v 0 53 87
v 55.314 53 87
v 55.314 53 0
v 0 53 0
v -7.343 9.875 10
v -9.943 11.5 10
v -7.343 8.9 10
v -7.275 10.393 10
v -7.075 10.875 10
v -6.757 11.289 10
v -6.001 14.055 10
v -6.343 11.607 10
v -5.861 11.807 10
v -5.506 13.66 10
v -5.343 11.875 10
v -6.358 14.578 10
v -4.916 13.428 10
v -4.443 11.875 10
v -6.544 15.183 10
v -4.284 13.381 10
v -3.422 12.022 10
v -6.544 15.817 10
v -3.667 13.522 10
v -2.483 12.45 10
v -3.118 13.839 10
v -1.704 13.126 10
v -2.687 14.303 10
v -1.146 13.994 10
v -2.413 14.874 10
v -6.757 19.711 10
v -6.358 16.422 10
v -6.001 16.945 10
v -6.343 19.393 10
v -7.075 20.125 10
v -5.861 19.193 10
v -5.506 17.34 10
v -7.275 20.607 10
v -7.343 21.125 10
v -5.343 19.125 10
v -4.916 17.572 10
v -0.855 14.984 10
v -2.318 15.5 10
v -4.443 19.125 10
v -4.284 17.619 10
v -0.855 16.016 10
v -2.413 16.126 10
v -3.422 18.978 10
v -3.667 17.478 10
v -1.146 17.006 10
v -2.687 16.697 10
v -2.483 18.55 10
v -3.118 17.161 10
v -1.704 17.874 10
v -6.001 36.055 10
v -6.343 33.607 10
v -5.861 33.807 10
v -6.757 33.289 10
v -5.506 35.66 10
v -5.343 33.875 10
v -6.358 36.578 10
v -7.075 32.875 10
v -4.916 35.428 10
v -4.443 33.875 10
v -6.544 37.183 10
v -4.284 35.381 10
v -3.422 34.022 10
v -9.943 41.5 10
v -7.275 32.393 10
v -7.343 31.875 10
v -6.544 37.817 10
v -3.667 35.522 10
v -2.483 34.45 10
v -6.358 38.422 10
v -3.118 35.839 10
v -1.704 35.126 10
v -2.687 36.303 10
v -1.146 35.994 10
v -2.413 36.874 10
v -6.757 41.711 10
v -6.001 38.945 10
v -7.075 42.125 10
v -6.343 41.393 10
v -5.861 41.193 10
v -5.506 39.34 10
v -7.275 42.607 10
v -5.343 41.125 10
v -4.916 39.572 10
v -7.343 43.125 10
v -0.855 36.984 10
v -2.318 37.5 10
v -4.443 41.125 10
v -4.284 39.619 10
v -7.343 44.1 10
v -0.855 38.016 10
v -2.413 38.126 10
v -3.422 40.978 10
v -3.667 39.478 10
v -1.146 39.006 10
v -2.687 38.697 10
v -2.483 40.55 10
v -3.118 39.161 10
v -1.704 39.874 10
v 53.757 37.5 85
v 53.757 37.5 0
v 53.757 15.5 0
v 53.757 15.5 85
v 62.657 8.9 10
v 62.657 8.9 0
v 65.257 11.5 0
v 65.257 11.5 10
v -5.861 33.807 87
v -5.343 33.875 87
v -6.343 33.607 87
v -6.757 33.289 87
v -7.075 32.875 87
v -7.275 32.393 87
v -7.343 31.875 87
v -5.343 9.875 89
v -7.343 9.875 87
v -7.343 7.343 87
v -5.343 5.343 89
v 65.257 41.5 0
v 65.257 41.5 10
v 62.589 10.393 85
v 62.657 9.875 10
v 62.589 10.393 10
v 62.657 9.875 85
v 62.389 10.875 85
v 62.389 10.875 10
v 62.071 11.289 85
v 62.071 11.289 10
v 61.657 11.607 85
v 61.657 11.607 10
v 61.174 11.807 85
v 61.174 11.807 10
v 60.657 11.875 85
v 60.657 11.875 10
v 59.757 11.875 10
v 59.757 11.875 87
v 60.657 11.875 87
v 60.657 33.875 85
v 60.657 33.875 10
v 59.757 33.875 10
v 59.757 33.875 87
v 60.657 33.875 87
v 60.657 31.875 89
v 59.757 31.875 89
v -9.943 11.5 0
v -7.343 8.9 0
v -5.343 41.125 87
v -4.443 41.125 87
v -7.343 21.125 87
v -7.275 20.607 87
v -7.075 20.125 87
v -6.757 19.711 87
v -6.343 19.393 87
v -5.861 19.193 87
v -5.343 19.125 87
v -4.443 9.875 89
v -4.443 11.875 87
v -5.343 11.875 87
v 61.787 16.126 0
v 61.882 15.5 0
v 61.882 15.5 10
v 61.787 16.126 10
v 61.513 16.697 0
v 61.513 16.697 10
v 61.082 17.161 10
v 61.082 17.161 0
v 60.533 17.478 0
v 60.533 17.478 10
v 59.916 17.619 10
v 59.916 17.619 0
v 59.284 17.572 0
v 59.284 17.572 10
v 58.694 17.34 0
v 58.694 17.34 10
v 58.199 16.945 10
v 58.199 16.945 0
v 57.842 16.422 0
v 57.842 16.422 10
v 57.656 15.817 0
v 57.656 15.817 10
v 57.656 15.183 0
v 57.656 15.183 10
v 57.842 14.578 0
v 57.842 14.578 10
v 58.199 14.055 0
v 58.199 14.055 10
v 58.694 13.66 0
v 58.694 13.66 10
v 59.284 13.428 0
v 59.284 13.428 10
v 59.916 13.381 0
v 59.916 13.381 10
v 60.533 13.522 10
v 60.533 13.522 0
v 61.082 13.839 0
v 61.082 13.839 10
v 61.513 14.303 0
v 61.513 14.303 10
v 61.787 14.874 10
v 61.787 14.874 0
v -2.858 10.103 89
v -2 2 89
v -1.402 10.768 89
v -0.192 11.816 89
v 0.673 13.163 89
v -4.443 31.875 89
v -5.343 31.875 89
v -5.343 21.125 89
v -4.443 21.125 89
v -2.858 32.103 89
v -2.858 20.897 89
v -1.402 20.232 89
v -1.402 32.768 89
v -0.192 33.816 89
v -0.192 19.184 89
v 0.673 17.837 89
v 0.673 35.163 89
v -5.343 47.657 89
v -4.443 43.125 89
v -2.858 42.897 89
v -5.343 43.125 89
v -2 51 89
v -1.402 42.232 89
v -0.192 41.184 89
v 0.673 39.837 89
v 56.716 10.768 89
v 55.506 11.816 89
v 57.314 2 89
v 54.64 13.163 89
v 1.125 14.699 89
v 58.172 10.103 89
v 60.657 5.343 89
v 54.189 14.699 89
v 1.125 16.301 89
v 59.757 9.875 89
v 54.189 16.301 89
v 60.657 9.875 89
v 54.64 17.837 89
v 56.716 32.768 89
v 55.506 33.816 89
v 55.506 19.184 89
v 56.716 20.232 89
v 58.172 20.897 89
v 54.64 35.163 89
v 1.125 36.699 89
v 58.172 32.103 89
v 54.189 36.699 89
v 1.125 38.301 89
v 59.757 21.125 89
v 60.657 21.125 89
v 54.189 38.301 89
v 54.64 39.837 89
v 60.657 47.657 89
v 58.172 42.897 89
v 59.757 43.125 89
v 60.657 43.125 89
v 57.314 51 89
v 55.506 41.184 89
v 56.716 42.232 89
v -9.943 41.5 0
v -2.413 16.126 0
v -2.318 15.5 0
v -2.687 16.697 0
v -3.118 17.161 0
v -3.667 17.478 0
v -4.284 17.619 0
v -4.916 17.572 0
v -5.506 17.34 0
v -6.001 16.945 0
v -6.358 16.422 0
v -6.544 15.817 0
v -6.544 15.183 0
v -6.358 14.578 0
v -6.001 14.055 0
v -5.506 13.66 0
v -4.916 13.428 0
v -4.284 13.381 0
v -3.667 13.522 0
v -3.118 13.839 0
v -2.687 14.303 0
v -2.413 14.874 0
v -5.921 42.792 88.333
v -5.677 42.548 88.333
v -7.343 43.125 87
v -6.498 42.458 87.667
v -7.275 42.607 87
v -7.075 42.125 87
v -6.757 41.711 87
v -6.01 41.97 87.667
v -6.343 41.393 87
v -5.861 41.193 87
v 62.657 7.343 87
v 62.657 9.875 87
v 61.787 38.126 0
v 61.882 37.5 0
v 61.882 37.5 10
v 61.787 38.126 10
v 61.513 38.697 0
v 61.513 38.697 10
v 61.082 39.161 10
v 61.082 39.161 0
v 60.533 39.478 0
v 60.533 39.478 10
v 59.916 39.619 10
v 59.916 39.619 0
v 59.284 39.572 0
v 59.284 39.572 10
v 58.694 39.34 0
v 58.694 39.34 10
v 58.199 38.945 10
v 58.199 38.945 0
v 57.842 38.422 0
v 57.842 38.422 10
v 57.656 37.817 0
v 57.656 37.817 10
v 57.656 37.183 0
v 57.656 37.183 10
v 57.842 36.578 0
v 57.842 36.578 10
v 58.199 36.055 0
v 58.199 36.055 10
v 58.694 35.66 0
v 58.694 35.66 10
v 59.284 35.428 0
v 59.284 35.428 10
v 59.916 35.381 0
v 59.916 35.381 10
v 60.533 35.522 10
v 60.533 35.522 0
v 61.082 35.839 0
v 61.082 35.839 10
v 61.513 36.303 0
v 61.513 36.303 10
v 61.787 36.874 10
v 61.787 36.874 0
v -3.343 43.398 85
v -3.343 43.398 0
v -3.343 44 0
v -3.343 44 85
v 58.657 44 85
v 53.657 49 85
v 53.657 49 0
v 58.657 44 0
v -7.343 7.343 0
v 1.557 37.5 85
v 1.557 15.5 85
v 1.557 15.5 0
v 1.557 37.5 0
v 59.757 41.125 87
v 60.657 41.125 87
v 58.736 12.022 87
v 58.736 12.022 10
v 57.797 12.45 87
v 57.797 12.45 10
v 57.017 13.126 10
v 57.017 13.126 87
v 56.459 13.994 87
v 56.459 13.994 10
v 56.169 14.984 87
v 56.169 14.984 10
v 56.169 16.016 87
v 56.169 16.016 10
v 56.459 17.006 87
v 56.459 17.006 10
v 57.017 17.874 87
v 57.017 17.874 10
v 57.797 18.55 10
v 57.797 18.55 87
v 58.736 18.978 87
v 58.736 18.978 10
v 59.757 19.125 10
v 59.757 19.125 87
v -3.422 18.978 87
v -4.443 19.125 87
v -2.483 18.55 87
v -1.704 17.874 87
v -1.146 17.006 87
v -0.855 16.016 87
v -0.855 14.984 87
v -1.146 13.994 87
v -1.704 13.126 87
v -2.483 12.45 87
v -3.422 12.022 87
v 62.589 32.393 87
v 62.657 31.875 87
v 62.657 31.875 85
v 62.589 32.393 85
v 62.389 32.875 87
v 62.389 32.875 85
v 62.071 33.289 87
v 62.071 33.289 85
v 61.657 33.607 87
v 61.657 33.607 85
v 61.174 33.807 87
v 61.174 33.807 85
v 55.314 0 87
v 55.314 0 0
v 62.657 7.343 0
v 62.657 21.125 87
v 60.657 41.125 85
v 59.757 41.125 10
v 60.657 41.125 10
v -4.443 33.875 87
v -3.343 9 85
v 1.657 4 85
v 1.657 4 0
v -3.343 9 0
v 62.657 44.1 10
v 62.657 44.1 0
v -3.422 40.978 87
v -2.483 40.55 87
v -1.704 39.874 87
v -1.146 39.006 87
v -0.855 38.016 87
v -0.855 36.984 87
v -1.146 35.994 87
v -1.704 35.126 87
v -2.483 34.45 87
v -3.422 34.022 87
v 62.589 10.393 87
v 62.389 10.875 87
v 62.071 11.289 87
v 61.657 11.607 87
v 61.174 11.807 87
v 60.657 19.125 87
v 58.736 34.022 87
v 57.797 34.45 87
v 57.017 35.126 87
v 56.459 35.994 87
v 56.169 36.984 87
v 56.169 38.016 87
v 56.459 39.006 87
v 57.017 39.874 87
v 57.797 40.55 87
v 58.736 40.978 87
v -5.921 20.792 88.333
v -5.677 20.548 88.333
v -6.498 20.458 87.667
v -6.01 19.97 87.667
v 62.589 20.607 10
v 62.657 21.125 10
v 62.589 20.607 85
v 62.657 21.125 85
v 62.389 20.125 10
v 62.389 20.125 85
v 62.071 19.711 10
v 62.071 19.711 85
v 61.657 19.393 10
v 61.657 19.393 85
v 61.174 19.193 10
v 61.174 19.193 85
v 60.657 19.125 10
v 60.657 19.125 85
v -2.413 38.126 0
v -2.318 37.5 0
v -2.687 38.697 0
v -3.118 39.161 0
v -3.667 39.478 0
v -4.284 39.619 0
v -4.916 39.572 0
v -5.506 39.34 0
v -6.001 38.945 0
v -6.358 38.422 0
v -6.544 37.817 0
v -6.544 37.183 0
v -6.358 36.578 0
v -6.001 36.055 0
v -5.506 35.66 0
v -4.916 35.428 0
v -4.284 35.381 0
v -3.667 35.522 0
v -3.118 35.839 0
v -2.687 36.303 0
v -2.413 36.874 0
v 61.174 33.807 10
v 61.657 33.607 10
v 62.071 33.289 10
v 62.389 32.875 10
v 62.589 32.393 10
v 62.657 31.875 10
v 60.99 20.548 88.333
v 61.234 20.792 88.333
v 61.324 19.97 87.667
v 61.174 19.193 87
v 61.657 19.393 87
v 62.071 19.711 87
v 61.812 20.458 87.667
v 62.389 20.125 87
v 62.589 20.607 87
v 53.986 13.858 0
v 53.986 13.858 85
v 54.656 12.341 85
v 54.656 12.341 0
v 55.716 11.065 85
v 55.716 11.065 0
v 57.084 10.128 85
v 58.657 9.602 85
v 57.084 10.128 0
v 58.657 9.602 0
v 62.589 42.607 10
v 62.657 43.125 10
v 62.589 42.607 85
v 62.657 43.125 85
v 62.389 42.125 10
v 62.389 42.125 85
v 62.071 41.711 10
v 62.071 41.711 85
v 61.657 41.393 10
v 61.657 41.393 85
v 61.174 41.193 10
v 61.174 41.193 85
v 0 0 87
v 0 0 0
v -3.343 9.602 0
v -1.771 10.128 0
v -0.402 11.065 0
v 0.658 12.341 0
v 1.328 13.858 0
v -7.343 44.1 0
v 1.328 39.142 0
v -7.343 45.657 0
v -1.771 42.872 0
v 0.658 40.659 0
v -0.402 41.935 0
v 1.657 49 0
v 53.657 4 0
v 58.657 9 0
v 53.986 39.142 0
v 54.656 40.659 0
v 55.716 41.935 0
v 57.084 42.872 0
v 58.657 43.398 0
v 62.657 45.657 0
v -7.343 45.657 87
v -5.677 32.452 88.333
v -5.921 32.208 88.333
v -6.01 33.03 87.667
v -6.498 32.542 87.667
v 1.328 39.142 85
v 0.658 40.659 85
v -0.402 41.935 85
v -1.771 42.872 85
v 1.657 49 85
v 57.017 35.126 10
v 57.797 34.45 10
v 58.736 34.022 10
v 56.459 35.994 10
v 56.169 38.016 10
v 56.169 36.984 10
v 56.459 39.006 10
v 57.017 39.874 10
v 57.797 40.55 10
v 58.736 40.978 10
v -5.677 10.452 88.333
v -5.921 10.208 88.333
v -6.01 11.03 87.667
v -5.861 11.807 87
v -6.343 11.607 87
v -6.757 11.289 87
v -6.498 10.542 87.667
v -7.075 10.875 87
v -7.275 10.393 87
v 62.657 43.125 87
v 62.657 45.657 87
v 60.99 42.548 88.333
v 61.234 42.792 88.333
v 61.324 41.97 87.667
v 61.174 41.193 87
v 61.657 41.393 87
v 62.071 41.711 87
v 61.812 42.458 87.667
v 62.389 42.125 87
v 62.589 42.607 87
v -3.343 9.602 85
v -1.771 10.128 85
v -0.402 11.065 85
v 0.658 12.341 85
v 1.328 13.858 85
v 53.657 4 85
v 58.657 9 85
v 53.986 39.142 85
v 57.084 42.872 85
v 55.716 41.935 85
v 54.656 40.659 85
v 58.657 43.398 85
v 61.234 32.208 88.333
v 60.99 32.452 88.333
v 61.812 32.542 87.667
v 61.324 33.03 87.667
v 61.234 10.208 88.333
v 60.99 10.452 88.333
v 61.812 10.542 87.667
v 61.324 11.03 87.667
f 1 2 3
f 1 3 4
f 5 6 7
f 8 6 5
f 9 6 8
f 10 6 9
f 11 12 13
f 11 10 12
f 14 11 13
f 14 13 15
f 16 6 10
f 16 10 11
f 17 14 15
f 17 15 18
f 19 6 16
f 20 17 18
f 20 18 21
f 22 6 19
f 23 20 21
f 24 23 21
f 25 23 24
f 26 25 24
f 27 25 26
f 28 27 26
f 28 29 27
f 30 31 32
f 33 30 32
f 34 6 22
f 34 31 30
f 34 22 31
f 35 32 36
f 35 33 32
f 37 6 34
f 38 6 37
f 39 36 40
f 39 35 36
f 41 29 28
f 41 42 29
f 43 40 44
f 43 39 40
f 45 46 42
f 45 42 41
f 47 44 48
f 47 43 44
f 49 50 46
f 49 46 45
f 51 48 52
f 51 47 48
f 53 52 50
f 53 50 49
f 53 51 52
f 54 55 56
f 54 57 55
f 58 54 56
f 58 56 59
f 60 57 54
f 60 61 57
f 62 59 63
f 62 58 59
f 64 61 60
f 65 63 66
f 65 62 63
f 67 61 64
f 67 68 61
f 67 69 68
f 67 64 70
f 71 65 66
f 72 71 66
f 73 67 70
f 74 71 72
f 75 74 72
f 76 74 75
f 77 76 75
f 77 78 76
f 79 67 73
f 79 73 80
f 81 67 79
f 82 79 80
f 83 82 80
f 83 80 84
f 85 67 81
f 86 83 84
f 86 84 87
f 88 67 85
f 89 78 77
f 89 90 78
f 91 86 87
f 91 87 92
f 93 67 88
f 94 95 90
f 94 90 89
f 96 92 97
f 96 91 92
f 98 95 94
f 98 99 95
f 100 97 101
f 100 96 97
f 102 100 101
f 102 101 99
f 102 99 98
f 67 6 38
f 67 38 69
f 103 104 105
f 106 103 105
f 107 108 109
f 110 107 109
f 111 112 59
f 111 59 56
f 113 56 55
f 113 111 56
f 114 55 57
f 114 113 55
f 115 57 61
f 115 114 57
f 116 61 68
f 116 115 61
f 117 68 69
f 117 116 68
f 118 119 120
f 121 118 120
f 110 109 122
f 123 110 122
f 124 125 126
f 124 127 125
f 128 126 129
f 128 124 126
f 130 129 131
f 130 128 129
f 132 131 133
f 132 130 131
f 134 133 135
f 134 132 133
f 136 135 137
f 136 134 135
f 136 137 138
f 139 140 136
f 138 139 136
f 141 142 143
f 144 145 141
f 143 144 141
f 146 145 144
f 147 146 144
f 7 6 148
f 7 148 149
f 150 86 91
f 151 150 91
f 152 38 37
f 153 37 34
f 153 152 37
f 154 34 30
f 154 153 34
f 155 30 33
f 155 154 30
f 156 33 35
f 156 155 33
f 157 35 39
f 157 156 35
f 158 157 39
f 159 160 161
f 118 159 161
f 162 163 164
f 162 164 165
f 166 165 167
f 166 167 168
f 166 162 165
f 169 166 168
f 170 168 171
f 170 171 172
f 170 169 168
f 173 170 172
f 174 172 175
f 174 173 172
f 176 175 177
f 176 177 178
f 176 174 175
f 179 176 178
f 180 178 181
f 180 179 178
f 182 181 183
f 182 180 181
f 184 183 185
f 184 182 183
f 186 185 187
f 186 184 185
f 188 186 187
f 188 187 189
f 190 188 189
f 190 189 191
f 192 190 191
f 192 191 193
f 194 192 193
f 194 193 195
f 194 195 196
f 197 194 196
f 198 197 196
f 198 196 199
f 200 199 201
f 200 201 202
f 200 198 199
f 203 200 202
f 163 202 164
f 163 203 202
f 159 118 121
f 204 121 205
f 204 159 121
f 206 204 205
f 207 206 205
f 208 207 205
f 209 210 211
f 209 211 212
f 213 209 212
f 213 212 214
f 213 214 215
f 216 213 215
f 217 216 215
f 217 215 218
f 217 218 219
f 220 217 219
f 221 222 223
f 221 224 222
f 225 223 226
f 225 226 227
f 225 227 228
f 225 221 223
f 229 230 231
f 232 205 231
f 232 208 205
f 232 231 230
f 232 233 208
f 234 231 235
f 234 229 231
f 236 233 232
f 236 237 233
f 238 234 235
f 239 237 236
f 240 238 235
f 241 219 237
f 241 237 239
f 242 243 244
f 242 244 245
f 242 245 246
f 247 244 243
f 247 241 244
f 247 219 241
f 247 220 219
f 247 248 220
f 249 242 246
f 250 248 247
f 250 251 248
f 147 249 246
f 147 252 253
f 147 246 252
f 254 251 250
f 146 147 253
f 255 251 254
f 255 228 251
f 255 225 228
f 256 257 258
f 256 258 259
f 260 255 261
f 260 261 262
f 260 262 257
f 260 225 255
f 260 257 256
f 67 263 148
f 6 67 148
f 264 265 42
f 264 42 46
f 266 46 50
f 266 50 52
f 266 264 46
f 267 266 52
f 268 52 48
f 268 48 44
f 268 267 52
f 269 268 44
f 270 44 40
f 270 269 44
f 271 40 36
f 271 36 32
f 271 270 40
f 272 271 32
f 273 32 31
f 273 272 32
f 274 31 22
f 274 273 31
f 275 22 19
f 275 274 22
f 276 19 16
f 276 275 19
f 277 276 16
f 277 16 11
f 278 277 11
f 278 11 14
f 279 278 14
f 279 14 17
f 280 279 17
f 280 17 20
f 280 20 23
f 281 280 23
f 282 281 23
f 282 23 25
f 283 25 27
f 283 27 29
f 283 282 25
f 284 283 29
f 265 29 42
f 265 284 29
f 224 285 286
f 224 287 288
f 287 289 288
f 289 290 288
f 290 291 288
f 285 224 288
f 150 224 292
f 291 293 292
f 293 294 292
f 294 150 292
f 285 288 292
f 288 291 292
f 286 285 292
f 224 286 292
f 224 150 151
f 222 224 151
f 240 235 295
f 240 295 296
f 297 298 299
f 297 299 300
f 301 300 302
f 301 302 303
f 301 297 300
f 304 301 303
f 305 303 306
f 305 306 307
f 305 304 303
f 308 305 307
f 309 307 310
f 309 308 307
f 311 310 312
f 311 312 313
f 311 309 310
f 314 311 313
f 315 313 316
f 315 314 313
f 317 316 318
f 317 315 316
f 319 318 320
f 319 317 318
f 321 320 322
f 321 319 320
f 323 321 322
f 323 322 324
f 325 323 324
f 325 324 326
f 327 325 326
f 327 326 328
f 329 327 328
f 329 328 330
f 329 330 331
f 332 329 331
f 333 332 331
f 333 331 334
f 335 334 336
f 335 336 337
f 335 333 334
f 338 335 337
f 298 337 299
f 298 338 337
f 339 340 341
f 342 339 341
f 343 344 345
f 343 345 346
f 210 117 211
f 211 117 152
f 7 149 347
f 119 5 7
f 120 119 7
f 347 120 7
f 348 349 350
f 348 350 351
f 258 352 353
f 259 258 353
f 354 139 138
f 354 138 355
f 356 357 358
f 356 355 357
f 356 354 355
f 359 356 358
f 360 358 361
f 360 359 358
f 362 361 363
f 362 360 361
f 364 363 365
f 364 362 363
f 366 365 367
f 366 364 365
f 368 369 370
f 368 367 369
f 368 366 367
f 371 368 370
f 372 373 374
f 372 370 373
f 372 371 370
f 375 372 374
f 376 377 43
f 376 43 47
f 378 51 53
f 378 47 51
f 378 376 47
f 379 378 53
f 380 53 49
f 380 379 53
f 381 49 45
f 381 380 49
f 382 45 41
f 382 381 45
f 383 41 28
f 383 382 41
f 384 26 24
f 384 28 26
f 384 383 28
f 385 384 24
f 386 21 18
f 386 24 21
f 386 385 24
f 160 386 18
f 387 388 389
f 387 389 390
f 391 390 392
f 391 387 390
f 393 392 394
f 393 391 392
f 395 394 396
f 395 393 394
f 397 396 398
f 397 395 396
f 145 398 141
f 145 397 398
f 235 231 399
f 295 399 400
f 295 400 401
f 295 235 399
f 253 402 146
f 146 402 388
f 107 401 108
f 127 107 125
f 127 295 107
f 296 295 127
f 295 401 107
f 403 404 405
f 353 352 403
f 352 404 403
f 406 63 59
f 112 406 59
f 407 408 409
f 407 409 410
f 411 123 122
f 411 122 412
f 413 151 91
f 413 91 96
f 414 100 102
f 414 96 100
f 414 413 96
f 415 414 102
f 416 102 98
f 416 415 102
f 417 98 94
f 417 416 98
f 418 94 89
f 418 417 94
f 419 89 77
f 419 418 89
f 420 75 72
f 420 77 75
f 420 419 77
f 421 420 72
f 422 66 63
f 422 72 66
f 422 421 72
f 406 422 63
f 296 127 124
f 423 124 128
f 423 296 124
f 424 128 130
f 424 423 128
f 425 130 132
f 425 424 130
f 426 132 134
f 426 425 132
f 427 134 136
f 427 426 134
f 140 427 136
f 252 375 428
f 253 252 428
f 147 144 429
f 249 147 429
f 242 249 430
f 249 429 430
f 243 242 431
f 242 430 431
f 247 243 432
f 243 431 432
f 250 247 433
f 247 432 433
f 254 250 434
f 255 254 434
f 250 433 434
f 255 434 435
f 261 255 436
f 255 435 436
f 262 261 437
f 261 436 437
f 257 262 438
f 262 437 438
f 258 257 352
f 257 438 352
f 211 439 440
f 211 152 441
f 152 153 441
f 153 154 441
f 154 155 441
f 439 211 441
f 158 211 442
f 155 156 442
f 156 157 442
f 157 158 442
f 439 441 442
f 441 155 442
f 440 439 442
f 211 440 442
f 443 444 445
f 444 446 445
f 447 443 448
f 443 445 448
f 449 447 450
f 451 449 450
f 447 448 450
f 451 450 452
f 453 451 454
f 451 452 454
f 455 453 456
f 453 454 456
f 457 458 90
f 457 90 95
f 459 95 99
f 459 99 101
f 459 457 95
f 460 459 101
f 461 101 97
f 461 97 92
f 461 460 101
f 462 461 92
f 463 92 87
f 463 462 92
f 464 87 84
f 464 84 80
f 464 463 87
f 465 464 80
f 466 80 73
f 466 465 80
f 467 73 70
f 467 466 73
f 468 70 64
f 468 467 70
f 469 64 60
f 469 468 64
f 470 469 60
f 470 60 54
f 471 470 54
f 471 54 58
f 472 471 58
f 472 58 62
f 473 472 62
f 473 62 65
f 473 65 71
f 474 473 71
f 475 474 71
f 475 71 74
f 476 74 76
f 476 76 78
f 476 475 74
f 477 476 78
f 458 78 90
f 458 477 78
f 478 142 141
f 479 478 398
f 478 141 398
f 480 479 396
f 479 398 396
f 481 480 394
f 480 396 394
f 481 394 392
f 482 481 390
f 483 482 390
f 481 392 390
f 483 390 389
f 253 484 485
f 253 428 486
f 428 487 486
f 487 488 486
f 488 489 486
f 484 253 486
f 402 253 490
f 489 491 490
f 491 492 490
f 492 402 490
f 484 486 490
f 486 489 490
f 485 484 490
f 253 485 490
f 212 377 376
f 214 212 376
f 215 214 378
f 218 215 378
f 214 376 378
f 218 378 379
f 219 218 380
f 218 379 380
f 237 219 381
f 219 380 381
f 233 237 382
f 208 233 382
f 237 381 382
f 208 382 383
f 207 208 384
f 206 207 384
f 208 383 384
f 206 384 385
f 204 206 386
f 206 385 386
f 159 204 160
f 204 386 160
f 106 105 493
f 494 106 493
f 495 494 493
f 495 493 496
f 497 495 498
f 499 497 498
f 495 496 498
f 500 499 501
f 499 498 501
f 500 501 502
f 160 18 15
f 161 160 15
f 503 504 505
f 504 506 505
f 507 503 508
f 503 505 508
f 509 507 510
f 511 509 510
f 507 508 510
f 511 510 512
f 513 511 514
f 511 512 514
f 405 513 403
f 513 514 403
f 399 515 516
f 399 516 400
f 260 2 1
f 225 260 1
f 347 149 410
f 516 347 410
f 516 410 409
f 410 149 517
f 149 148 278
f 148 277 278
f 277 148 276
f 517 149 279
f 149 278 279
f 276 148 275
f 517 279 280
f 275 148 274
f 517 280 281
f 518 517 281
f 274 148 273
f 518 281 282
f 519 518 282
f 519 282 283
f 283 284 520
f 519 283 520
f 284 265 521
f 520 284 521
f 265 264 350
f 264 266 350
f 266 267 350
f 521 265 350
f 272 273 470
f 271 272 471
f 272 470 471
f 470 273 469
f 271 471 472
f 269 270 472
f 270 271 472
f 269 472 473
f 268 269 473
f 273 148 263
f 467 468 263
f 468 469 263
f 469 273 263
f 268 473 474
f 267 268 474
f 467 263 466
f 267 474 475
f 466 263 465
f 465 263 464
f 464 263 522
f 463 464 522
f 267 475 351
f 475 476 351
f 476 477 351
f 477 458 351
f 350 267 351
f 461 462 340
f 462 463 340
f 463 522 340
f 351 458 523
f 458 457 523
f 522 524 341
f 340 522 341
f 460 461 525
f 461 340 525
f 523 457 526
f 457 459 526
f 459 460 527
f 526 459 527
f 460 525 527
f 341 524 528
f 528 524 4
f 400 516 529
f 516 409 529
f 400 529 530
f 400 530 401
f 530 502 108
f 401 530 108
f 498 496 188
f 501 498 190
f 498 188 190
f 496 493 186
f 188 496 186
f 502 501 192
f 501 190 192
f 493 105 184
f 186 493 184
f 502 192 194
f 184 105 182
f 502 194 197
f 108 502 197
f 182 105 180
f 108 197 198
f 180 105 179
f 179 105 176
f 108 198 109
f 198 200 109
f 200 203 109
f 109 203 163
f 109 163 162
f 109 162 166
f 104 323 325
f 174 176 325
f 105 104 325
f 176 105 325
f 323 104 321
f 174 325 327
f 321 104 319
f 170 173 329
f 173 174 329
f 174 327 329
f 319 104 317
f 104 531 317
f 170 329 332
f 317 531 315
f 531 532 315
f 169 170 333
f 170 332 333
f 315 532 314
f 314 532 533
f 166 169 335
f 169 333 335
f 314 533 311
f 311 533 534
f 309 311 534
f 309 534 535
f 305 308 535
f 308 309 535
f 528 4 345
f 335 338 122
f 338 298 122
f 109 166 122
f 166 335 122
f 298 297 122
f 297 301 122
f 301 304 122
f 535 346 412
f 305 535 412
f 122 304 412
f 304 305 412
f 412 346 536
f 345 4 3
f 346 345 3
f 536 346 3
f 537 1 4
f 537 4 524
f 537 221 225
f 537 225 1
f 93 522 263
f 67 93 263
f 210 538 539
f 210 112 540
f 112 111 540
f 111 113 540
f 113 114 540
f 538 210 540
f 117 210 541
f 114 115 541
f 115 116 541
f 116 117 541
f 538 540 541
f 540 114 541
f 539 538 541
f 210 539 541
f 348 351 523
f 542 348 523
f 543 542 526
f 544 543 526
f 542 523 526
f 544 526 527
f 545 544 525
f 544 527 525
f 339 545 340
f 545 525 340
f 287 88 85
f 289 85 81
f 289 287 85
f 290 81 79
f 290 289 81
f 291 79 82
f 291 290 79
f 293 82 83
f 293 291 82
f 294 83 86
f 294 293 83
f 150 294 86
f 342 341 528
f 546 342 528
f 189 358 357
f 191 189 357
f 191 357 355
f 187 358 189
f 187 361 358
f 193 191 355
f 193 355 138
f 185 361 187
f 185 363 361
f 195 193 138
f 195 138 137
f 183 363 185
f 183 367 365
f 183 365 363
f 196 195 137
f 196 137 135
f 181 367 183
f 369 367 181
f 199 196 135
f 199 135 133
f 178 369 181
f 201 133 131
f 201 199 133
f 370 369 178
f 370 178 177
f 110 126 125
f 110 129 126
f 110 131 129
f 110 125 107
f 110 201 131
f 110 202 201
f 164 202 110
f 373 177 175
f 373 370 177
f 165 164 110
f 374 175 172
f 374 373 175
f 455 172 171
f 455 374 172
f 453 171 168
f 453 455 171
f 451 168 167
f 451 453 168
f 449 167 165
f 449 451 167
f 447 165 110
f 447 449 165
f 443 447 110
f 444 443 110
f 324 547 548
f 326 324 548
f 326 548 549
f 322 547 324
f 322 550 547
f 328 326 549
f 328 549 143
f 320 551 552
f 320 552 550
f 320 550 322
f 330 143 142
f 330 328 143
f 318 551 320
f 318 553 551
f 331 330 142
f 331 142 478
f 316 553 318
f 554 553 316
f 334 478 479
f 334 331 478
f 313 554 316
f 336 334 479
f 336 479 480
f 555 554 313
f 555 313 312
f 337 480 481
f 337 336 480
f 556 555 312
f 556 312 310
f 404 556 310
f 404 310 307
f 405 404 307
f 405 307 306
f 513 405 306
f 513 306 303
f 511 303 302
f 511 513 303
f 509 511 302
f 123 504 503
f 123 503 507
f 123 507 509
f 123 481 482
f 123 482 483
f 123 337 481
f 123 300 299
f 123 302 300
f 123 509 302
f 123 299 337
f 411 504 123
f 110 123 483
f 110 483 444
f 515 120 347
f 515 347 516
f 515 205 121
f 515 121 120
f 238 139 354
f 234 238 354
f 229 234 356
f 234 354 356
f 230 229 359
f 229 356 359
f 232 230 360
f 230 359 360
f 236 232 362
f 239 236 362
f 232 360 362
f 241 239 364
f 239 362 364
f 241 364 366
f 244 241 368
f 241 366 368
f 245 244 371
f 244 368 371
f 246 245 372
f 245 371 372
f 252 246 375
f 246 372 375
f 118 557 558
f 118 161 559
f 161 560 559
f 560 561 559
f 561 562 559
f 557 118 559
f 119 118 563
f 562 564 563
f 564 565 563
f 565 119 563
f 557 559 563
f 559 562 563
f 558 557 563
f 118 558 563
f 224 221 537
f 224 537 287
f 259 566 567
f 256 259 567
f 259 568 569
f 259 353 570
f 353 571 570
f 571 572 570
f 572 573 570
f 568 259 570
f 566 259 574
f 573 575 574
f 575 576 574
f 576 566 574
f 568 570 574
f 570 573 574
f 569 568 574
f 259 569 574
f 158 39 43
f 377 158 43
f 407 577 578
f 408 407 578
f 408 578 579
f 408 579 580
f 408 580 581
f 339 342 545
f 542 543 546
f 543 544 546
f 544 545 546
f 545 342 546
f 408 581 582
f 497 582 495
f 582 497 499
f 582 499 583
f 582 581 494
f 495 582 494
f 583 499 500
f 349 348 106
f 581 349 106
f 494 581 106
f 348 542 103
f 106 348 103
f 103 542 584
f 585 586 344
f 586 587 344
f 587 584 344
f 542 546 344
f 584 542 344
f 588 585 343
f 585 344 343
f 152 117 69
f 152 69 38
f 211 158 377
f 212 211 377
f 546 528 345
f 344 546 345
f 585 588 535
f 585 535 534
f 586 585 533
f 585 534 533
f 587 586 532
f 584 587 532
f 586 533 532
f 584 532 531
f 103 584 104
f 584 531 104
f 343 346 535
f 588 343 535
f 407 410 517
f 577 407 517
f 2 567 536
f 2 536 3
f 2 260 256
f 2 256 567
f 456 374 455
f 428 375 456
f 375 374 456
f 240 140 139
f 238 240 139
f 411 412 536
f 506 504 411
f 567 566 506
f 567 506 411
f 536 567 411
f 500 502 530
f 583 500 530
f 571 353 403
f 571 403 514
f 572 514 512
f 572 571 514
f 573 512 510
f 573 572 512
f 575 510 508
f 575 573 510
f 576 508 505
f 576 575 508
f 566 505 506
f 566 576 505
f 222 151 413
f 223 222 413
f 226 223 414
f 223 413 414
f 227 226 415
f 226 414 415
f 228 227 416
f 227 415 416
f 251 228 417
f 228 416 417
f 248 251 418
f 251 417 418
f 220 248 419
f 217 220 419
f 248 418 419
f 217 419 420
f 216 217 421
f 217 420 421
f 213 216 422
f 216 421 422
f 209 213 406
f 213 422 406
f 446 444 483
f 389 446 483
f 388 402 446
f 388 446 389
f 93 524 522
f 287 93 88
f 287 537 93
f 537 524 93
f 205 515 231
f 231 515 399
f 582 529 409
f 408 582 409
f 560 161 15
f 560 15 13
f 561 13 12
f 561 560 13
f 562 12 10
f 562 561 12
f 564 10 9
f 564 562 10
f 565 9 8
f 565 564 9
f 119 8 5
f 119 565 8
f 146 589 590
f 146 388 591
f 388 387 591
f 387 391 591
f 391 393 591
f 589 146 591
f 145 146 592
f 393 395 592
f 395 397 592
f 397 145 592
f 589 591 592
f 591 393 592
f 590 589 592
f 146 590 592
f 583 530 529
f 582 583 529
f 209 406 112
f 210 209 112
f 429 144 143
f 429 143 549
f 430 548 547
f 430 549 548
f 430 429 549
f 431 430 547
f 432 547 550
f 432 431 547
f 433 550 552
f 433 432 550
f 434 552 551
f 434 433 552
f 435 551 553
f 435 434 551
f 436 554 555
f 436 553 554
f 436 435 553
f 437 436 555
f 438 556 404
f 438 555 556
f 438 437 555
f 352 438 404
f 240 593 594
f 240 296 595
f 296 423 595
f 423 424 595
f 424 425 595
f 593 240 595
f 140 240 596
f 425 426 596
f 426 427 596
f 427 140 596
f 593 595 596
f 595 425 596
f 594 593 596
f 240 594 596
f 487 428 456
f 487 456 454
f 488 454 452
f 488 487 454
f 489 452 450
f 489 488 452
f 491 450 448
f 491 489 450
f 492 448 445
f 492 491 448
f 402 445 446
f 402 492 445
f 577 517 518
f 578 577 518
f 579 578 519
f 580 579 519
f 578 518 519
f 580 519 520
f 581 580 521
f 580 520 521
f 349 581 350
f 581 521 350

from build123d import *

# Parameters (mm, degrees)
BOSS_EXTRUDE1_DEPTH = 85
SKETCH1_3_R         = 2.125
BOSS_EXTRUDE2_DEPTH = 10
FILLET1_R           = 2
BOSS_EXTRUDE3_START = 4
BOSS_EXTRUDE3_DEPTH = 4
CHAMFER1_SIZE       = 2


with BuildPart() as part:
    # Sketch1 → Boss-Extrude1 (new body)
    with BuildSketch(Plane.XY):
        with BuildLine():
            Line((55.313708499, 53), (0, 53))
            Line((0, 53), (-7.343145751, 45.656854249))
            Line((-7.343145751, 45.656854249), (-7.343145751, 41.125))
            Line((-7.343145751, 41.125), (-4.443145751, 41.125))
            ThreePointArc((-4.443145751, 41.125), (-0.818145751, 37.5), (-4.443145751, 33.875))
            Line((-4.443145751, 33.875), (-7.343145751, 33.875))
            Line((-7.343145751, 33.875), (-7.343145751, 19.125))
            Line((-7.343145751, 19.125), (-4.443145751, 19.125))
            ThreePointArc((-4.443145751, 19.125), (-0.818145751, 15.5), (-4.443145751, 11.875))
            Line((-4.443145751, 11.875), (-7.343145751, 11.875))
            Line((-7.343145751, 11.875), (-7.343145751, 7.343145751))
            Line((-7.343145751, 7.343145751), (0, 0))
            Line((0, 0), (55.313708499, 0))
            Line((55.313708499, 0), (62.656854249, 7.343145751))
            Line((62.656854249, 7.343145751), (62.656854249, 11.875))
            Line((62.656854249, 11.875), (59.756854249, 11.875))
            ThreePointArc((59.756854249, 11.875), (56.131854249, 15.5), (59.756854249, 19.125))
            Line((59.756854249, 19.125), (62.656854249, 19.125))
            Line((62.656854249, 19.125), (62.656854249, 33.875))
            Line((62.656854249, 33.875), (59.756854249, 33.875))
            ThreePointArc((59.756854249, 33.875), (56.131854249, 37.5), (59.756854249, 41.125))
            Line((59.756854249, 41.125), (62.656854249, 41.125))
            Line((62.656854249, 41.125), (62.656854249, 45.656854249))
            Line((62.656854249, 45.656854249), (55.313708499, 53))
        make_face()
        with BuildLine():
            Line((53.656854249, 4), (1.656854249, 4))
            Line((1.656854249, 4), (-3.343145751, 9))
            Line((-3.343145751, 9), (-3.343145751, 9.601695159))
            ThreePointArc((-3.343145751, 9.601695159), (0.172046553, 11.665942097), (1.556854249, 15.5))
            Line((1.556854249, 15.5), (1.556854249, 37.5))
            ThreePointArc((1.556854249, 37.5), (0.172046553, 41.334057903), (-3.343145751, 43.398304841))
            Line((-3.343145751, 43.398304841), (-3.343145751, 44))
            Line((-3.343145751, 44), (1.656854249, 49))
            Line((1.656854249, 49), (53.656854249, 49))
            Line((53.656854249, 49), (58.656854249, 44))
            Line((58.656854249, 44), (58.656854249, 43.398304841))
            ThreePointArc((58.656854249, 43.398304841), (55.141661946, 41.334057903), (53.756854249, 37.5))
            Line((53.756854249, 37.5), (53.756854249, 15.5))
            ThreePointArc((53.756854249, 15.5), (55.141661946, 11.665942097), (58.656854249, 9.601695159))
            Line((58.656854249, 9.601695159), (58.656854249, 9))
            Line((58.656854249, 9), (53.656854249, 4))
        make_face(mode=Mode.SUBTRACT)
    extrude(amount=BOSS_EXTRUDE1_DEPTH)

    # Sketch1<3> → Boss-Extrude2 (add)
    # profile 1 of 2: a face of its own
    with BuildSketch(Plane.XY):
        with BuildLine():
            ThreePointArc((-4.443145751, 33.875), (-0.818145751, 37.5), (-4.443145751, 41.125))
            Line((-4.443145751, 41.125), (-7.343145751, 41.125))
            Line((-7.343145751, 41.125), (-7.343145751, 44.1))
            Line((-7.343145751, 44.1), (-9.943145751, 41.5))
            Line((-9.943145751, 41.5), (-9.943145751, 11.5))
            Line((-9.943145751, 11.5), (-7.343145751, 8.9))
            Line((-7.343145751, 8.9), (-7.343145751, 11.875))
            Line((-7.343145751, 11.875), (-4.443145751, 11.875))
            ThreePointArc((-4.443145751, 11.875), (-0.818145751, 15.5), (-4.443145751, 19.125))
            Line((-4.443145751, 19.125), (-7.343145751, 19.125))
            Line((-7.343145751, 19.125), (-7.343145751, 33.875))
            Line((-7.343145751, 33.875), (-4.443145751, 33.875))
        make_face()
        with Locations((-4.443145751, 15.5)):
            Circle(SKETCH1_3_R, mode=Mode.SUBTRACT)
        with Locations((-4.443145751, 37.5)):
            Circle(SKETCH1_3_R, mode=Mode.SUBTRACT)
    # profile 2 of 2: a face of its own
    with BuildSketch(Plane.XY):
        with BuildLine():
            Line((65.256854249, 41.5), (62.656854249, 44.1))
            Line((62.656854249, 44.1), (62.656854249, 41.125))
            Line((62.656854249, 41.125), (59.756854249, 41.125))
            ThreePointArc((59.756854249, 41.125), (56.131854249, 37.5), (59.756854249, 33.875))
            Line((59.756854249, 33.875), (62.656854249, 33.875))
            Line((62.656854249, 33.875), (62.656854249, 19.125))
            Line((62.656854249, 19.125), (59.756854249, 19.125))
            ThreePointArc((59.756854249, 19.125), (56.131854249, 15.5), (59.756854249, 11.875))
            Line((59.756854249, 11.875), (62.656854249, 11.875))
            Line((62.656854249, 11.875), (62.656854249, 8.9))
            Line((62.656854249, 8.9), (65.256854249, 11.5))
            Line((65.256854249, 11.5), (65.256854249, 41.5))
        make_face()
        with Locations((59.756854249, 37.5)):
            Circle(SKETCH1_3_R, mode=Mode.SUBTRACT)
        with Locations((59.756854249, 15.5)):
            Circle(SKETCH1_3_R, mode=Mode.SUBTRACT)
    extrude(amount=BOSS_EXTRUDE2_DEPTH)

    # Fillet1
    fillet1_edges = [part.edges().sort_by_distance(p)[0] for p in [
        (62.656854249, 41.125, 47.5),
        (62.656854249, 33.875, 47.5),
        (62.656854249, 19.125, 47.5),
        (62.656854249, 11.875, 47.5),
        (-7.343145751, 11.875, 47.5),
        (-7.343145751, 19.125, 47.5),
        (-7.343145751, 33.875, 47.5),
        (-7.343145751, 41.125, 47.5),
    ]]
    fillet(fillet1_edges, radius=FILLET1_R)

    # Sketch2 → Boss-Extrude3 (add)
    with BuildSketch(Plane.XY.offset(85).offset(BOSS_EXTRUDE3_START)):
        with BuildLine():
            Line((-7.343145751, 31.875), (-7.343145751, 21.125))
            ThreePointArc((-7.343145751, 21.125), (-6.757359313, 19.710786438), (-5.343145751, 19.125))
            Line((-5.343145751, 19.125), (-4.443145751, 19.125))
            ThreePointArc((-4.443145751, 19.125), (-0.818145751, 15.5), (-4.443145751, 11.875))
            Line((-4.443145751, 11.875), (-5.343145751, 11.875))
            ThreePointArc((-5.343145751, 11.875), (-6.757359313, 11.289213562), (-7.343145751, 9.875))
            Line((-7.343145751, 9.875), (-7.343145751, 7.343145751))
            Line((-7.343145751, 7.343145751), (0, 0))
            Line((0, 0), (55.313708499, 0))
            Line((55.313708499, 0), (62.656854249, 7.343145751))
            Line((62.656854249, 7.343145751), (62.656854249, 9.875))
            ThreePointArc((62.656854249, 9.875), (62.071067812, 11.289213562), (60.656854249, 11.875))
            Line((60.656854249, 11.875), (59.756854249, 11.875))
            ThreePointArc((59.756854249, 11.875), (56.131854249, 15.5), (59.756854249, 19.125))
            Line((59.756854249, 19.125), (60.656854249, 19.125))
            ThreePointArc((60.656854249, 19.125), (62.071067812, 19.710786438), (62.656854249, 21.125))
            Line((62.656854249, 21.125), (62.656854249, 31.875))
            ThreePointArc((62.656854249, 31.875), (62.071067812, 33.289213562), (60.656854249, 33.875))
            Line((60.656854249, 33.875), (59.756854249, 33.875))
            ThreePointArc((59.756854249, 33.875), (56.131854249, 37.5), (59.756854249, 41.125))
            Line((59.756854249, 41.125), (60.656854249, 41.125))
            ThreePointArc((60.656854249, 41.125), (62.071067812, 41.710786438), (62.656854249, 43.125))
            Line((62.656854249, 43.125), (62.656854249, 45.656854249))
            Line((62.656854249, 45.656854249), (55.313708499, 53))
            Line((55.313708499, 53), (0, 53))
            Line((0, 53), (-7.343145751, 45.656854249))
            Line((-7.343145751, 45.656854249), (-7.343145751, 43.125))
            ThreePointArc((-7.343145751, 43.125), (-6.757359313, 41.710786438), (-5.343145751, 41.125))
            Line((-5.343145751, 41.125), (-4.443145751, 41.125))
            ThreePointArc((-4.443145751, 41.125), (-0.818145751, 37.5), (-4.443145751, 33.875))
            Line((-4.443145751, 33.875), (-5.343145751, 33.875))
            ThreePointArc((-5.343145751, 33.875), (-6.757359313, 33.289213562), (-7.343145751, 31.875))
        make_face()
    extrude(amount=-BOSS_EXTRUDE3_DEPTH)

    # Chamfer1
    chamfer1_edges = [part.edges().sort_by_distance(p)[0] for p in [
        (-7.343145751, 44.390927125, 89),
        (-6.757359313, 41.710786438, 89),
        (-4.893145751, 41.125, 89),
        (-0.818145751, 37.5, 89),
        (-4.893145751, 33.875, 89),
        (-6.757359313, 33.289213562, 89),
        (-7.343145751, 26.5, 89),
        (-6.757359313, 19.710786438, 89),
        (-4.893145751, 19.125, 89),
        (-0.818145751, 15.5, 89),
        (-4.893145751, 11.875, 89),
        (-6.757359313, 11.289213562, 89),
        (-7.343145751, 8.609072875, 89),
        (27.656854249, 0, 89),
        (62.656854249, 8.609072875, 89),
        (62.071067812, 11.289213562, 89),
        (60.206854249, 11.875, 89),
        (56.131854249, 15.5, 89),
        (60.206854249, 19.125, 89),
        (62.071067812, 19.710786438, 89),
        (62.656854249, 26.5, 89),
        (62.071067812, 33.289213562, 89),
        (60.206854249, 33.875, 89),
        (56.131854249, 37.5, 89),
        (60.206854249, 41.125, 89),
        (62.071067812, 41.710786438, 89),
        (62.656854249, 44.390927125, 89),
        (27.656854249, 53, 89),
    ]]
    chamfer(chamfer1_edges, length=CHAMFER1_SIZE - 0.0001)  # a hair under: the kernel refuses the full size


solid = part.part
